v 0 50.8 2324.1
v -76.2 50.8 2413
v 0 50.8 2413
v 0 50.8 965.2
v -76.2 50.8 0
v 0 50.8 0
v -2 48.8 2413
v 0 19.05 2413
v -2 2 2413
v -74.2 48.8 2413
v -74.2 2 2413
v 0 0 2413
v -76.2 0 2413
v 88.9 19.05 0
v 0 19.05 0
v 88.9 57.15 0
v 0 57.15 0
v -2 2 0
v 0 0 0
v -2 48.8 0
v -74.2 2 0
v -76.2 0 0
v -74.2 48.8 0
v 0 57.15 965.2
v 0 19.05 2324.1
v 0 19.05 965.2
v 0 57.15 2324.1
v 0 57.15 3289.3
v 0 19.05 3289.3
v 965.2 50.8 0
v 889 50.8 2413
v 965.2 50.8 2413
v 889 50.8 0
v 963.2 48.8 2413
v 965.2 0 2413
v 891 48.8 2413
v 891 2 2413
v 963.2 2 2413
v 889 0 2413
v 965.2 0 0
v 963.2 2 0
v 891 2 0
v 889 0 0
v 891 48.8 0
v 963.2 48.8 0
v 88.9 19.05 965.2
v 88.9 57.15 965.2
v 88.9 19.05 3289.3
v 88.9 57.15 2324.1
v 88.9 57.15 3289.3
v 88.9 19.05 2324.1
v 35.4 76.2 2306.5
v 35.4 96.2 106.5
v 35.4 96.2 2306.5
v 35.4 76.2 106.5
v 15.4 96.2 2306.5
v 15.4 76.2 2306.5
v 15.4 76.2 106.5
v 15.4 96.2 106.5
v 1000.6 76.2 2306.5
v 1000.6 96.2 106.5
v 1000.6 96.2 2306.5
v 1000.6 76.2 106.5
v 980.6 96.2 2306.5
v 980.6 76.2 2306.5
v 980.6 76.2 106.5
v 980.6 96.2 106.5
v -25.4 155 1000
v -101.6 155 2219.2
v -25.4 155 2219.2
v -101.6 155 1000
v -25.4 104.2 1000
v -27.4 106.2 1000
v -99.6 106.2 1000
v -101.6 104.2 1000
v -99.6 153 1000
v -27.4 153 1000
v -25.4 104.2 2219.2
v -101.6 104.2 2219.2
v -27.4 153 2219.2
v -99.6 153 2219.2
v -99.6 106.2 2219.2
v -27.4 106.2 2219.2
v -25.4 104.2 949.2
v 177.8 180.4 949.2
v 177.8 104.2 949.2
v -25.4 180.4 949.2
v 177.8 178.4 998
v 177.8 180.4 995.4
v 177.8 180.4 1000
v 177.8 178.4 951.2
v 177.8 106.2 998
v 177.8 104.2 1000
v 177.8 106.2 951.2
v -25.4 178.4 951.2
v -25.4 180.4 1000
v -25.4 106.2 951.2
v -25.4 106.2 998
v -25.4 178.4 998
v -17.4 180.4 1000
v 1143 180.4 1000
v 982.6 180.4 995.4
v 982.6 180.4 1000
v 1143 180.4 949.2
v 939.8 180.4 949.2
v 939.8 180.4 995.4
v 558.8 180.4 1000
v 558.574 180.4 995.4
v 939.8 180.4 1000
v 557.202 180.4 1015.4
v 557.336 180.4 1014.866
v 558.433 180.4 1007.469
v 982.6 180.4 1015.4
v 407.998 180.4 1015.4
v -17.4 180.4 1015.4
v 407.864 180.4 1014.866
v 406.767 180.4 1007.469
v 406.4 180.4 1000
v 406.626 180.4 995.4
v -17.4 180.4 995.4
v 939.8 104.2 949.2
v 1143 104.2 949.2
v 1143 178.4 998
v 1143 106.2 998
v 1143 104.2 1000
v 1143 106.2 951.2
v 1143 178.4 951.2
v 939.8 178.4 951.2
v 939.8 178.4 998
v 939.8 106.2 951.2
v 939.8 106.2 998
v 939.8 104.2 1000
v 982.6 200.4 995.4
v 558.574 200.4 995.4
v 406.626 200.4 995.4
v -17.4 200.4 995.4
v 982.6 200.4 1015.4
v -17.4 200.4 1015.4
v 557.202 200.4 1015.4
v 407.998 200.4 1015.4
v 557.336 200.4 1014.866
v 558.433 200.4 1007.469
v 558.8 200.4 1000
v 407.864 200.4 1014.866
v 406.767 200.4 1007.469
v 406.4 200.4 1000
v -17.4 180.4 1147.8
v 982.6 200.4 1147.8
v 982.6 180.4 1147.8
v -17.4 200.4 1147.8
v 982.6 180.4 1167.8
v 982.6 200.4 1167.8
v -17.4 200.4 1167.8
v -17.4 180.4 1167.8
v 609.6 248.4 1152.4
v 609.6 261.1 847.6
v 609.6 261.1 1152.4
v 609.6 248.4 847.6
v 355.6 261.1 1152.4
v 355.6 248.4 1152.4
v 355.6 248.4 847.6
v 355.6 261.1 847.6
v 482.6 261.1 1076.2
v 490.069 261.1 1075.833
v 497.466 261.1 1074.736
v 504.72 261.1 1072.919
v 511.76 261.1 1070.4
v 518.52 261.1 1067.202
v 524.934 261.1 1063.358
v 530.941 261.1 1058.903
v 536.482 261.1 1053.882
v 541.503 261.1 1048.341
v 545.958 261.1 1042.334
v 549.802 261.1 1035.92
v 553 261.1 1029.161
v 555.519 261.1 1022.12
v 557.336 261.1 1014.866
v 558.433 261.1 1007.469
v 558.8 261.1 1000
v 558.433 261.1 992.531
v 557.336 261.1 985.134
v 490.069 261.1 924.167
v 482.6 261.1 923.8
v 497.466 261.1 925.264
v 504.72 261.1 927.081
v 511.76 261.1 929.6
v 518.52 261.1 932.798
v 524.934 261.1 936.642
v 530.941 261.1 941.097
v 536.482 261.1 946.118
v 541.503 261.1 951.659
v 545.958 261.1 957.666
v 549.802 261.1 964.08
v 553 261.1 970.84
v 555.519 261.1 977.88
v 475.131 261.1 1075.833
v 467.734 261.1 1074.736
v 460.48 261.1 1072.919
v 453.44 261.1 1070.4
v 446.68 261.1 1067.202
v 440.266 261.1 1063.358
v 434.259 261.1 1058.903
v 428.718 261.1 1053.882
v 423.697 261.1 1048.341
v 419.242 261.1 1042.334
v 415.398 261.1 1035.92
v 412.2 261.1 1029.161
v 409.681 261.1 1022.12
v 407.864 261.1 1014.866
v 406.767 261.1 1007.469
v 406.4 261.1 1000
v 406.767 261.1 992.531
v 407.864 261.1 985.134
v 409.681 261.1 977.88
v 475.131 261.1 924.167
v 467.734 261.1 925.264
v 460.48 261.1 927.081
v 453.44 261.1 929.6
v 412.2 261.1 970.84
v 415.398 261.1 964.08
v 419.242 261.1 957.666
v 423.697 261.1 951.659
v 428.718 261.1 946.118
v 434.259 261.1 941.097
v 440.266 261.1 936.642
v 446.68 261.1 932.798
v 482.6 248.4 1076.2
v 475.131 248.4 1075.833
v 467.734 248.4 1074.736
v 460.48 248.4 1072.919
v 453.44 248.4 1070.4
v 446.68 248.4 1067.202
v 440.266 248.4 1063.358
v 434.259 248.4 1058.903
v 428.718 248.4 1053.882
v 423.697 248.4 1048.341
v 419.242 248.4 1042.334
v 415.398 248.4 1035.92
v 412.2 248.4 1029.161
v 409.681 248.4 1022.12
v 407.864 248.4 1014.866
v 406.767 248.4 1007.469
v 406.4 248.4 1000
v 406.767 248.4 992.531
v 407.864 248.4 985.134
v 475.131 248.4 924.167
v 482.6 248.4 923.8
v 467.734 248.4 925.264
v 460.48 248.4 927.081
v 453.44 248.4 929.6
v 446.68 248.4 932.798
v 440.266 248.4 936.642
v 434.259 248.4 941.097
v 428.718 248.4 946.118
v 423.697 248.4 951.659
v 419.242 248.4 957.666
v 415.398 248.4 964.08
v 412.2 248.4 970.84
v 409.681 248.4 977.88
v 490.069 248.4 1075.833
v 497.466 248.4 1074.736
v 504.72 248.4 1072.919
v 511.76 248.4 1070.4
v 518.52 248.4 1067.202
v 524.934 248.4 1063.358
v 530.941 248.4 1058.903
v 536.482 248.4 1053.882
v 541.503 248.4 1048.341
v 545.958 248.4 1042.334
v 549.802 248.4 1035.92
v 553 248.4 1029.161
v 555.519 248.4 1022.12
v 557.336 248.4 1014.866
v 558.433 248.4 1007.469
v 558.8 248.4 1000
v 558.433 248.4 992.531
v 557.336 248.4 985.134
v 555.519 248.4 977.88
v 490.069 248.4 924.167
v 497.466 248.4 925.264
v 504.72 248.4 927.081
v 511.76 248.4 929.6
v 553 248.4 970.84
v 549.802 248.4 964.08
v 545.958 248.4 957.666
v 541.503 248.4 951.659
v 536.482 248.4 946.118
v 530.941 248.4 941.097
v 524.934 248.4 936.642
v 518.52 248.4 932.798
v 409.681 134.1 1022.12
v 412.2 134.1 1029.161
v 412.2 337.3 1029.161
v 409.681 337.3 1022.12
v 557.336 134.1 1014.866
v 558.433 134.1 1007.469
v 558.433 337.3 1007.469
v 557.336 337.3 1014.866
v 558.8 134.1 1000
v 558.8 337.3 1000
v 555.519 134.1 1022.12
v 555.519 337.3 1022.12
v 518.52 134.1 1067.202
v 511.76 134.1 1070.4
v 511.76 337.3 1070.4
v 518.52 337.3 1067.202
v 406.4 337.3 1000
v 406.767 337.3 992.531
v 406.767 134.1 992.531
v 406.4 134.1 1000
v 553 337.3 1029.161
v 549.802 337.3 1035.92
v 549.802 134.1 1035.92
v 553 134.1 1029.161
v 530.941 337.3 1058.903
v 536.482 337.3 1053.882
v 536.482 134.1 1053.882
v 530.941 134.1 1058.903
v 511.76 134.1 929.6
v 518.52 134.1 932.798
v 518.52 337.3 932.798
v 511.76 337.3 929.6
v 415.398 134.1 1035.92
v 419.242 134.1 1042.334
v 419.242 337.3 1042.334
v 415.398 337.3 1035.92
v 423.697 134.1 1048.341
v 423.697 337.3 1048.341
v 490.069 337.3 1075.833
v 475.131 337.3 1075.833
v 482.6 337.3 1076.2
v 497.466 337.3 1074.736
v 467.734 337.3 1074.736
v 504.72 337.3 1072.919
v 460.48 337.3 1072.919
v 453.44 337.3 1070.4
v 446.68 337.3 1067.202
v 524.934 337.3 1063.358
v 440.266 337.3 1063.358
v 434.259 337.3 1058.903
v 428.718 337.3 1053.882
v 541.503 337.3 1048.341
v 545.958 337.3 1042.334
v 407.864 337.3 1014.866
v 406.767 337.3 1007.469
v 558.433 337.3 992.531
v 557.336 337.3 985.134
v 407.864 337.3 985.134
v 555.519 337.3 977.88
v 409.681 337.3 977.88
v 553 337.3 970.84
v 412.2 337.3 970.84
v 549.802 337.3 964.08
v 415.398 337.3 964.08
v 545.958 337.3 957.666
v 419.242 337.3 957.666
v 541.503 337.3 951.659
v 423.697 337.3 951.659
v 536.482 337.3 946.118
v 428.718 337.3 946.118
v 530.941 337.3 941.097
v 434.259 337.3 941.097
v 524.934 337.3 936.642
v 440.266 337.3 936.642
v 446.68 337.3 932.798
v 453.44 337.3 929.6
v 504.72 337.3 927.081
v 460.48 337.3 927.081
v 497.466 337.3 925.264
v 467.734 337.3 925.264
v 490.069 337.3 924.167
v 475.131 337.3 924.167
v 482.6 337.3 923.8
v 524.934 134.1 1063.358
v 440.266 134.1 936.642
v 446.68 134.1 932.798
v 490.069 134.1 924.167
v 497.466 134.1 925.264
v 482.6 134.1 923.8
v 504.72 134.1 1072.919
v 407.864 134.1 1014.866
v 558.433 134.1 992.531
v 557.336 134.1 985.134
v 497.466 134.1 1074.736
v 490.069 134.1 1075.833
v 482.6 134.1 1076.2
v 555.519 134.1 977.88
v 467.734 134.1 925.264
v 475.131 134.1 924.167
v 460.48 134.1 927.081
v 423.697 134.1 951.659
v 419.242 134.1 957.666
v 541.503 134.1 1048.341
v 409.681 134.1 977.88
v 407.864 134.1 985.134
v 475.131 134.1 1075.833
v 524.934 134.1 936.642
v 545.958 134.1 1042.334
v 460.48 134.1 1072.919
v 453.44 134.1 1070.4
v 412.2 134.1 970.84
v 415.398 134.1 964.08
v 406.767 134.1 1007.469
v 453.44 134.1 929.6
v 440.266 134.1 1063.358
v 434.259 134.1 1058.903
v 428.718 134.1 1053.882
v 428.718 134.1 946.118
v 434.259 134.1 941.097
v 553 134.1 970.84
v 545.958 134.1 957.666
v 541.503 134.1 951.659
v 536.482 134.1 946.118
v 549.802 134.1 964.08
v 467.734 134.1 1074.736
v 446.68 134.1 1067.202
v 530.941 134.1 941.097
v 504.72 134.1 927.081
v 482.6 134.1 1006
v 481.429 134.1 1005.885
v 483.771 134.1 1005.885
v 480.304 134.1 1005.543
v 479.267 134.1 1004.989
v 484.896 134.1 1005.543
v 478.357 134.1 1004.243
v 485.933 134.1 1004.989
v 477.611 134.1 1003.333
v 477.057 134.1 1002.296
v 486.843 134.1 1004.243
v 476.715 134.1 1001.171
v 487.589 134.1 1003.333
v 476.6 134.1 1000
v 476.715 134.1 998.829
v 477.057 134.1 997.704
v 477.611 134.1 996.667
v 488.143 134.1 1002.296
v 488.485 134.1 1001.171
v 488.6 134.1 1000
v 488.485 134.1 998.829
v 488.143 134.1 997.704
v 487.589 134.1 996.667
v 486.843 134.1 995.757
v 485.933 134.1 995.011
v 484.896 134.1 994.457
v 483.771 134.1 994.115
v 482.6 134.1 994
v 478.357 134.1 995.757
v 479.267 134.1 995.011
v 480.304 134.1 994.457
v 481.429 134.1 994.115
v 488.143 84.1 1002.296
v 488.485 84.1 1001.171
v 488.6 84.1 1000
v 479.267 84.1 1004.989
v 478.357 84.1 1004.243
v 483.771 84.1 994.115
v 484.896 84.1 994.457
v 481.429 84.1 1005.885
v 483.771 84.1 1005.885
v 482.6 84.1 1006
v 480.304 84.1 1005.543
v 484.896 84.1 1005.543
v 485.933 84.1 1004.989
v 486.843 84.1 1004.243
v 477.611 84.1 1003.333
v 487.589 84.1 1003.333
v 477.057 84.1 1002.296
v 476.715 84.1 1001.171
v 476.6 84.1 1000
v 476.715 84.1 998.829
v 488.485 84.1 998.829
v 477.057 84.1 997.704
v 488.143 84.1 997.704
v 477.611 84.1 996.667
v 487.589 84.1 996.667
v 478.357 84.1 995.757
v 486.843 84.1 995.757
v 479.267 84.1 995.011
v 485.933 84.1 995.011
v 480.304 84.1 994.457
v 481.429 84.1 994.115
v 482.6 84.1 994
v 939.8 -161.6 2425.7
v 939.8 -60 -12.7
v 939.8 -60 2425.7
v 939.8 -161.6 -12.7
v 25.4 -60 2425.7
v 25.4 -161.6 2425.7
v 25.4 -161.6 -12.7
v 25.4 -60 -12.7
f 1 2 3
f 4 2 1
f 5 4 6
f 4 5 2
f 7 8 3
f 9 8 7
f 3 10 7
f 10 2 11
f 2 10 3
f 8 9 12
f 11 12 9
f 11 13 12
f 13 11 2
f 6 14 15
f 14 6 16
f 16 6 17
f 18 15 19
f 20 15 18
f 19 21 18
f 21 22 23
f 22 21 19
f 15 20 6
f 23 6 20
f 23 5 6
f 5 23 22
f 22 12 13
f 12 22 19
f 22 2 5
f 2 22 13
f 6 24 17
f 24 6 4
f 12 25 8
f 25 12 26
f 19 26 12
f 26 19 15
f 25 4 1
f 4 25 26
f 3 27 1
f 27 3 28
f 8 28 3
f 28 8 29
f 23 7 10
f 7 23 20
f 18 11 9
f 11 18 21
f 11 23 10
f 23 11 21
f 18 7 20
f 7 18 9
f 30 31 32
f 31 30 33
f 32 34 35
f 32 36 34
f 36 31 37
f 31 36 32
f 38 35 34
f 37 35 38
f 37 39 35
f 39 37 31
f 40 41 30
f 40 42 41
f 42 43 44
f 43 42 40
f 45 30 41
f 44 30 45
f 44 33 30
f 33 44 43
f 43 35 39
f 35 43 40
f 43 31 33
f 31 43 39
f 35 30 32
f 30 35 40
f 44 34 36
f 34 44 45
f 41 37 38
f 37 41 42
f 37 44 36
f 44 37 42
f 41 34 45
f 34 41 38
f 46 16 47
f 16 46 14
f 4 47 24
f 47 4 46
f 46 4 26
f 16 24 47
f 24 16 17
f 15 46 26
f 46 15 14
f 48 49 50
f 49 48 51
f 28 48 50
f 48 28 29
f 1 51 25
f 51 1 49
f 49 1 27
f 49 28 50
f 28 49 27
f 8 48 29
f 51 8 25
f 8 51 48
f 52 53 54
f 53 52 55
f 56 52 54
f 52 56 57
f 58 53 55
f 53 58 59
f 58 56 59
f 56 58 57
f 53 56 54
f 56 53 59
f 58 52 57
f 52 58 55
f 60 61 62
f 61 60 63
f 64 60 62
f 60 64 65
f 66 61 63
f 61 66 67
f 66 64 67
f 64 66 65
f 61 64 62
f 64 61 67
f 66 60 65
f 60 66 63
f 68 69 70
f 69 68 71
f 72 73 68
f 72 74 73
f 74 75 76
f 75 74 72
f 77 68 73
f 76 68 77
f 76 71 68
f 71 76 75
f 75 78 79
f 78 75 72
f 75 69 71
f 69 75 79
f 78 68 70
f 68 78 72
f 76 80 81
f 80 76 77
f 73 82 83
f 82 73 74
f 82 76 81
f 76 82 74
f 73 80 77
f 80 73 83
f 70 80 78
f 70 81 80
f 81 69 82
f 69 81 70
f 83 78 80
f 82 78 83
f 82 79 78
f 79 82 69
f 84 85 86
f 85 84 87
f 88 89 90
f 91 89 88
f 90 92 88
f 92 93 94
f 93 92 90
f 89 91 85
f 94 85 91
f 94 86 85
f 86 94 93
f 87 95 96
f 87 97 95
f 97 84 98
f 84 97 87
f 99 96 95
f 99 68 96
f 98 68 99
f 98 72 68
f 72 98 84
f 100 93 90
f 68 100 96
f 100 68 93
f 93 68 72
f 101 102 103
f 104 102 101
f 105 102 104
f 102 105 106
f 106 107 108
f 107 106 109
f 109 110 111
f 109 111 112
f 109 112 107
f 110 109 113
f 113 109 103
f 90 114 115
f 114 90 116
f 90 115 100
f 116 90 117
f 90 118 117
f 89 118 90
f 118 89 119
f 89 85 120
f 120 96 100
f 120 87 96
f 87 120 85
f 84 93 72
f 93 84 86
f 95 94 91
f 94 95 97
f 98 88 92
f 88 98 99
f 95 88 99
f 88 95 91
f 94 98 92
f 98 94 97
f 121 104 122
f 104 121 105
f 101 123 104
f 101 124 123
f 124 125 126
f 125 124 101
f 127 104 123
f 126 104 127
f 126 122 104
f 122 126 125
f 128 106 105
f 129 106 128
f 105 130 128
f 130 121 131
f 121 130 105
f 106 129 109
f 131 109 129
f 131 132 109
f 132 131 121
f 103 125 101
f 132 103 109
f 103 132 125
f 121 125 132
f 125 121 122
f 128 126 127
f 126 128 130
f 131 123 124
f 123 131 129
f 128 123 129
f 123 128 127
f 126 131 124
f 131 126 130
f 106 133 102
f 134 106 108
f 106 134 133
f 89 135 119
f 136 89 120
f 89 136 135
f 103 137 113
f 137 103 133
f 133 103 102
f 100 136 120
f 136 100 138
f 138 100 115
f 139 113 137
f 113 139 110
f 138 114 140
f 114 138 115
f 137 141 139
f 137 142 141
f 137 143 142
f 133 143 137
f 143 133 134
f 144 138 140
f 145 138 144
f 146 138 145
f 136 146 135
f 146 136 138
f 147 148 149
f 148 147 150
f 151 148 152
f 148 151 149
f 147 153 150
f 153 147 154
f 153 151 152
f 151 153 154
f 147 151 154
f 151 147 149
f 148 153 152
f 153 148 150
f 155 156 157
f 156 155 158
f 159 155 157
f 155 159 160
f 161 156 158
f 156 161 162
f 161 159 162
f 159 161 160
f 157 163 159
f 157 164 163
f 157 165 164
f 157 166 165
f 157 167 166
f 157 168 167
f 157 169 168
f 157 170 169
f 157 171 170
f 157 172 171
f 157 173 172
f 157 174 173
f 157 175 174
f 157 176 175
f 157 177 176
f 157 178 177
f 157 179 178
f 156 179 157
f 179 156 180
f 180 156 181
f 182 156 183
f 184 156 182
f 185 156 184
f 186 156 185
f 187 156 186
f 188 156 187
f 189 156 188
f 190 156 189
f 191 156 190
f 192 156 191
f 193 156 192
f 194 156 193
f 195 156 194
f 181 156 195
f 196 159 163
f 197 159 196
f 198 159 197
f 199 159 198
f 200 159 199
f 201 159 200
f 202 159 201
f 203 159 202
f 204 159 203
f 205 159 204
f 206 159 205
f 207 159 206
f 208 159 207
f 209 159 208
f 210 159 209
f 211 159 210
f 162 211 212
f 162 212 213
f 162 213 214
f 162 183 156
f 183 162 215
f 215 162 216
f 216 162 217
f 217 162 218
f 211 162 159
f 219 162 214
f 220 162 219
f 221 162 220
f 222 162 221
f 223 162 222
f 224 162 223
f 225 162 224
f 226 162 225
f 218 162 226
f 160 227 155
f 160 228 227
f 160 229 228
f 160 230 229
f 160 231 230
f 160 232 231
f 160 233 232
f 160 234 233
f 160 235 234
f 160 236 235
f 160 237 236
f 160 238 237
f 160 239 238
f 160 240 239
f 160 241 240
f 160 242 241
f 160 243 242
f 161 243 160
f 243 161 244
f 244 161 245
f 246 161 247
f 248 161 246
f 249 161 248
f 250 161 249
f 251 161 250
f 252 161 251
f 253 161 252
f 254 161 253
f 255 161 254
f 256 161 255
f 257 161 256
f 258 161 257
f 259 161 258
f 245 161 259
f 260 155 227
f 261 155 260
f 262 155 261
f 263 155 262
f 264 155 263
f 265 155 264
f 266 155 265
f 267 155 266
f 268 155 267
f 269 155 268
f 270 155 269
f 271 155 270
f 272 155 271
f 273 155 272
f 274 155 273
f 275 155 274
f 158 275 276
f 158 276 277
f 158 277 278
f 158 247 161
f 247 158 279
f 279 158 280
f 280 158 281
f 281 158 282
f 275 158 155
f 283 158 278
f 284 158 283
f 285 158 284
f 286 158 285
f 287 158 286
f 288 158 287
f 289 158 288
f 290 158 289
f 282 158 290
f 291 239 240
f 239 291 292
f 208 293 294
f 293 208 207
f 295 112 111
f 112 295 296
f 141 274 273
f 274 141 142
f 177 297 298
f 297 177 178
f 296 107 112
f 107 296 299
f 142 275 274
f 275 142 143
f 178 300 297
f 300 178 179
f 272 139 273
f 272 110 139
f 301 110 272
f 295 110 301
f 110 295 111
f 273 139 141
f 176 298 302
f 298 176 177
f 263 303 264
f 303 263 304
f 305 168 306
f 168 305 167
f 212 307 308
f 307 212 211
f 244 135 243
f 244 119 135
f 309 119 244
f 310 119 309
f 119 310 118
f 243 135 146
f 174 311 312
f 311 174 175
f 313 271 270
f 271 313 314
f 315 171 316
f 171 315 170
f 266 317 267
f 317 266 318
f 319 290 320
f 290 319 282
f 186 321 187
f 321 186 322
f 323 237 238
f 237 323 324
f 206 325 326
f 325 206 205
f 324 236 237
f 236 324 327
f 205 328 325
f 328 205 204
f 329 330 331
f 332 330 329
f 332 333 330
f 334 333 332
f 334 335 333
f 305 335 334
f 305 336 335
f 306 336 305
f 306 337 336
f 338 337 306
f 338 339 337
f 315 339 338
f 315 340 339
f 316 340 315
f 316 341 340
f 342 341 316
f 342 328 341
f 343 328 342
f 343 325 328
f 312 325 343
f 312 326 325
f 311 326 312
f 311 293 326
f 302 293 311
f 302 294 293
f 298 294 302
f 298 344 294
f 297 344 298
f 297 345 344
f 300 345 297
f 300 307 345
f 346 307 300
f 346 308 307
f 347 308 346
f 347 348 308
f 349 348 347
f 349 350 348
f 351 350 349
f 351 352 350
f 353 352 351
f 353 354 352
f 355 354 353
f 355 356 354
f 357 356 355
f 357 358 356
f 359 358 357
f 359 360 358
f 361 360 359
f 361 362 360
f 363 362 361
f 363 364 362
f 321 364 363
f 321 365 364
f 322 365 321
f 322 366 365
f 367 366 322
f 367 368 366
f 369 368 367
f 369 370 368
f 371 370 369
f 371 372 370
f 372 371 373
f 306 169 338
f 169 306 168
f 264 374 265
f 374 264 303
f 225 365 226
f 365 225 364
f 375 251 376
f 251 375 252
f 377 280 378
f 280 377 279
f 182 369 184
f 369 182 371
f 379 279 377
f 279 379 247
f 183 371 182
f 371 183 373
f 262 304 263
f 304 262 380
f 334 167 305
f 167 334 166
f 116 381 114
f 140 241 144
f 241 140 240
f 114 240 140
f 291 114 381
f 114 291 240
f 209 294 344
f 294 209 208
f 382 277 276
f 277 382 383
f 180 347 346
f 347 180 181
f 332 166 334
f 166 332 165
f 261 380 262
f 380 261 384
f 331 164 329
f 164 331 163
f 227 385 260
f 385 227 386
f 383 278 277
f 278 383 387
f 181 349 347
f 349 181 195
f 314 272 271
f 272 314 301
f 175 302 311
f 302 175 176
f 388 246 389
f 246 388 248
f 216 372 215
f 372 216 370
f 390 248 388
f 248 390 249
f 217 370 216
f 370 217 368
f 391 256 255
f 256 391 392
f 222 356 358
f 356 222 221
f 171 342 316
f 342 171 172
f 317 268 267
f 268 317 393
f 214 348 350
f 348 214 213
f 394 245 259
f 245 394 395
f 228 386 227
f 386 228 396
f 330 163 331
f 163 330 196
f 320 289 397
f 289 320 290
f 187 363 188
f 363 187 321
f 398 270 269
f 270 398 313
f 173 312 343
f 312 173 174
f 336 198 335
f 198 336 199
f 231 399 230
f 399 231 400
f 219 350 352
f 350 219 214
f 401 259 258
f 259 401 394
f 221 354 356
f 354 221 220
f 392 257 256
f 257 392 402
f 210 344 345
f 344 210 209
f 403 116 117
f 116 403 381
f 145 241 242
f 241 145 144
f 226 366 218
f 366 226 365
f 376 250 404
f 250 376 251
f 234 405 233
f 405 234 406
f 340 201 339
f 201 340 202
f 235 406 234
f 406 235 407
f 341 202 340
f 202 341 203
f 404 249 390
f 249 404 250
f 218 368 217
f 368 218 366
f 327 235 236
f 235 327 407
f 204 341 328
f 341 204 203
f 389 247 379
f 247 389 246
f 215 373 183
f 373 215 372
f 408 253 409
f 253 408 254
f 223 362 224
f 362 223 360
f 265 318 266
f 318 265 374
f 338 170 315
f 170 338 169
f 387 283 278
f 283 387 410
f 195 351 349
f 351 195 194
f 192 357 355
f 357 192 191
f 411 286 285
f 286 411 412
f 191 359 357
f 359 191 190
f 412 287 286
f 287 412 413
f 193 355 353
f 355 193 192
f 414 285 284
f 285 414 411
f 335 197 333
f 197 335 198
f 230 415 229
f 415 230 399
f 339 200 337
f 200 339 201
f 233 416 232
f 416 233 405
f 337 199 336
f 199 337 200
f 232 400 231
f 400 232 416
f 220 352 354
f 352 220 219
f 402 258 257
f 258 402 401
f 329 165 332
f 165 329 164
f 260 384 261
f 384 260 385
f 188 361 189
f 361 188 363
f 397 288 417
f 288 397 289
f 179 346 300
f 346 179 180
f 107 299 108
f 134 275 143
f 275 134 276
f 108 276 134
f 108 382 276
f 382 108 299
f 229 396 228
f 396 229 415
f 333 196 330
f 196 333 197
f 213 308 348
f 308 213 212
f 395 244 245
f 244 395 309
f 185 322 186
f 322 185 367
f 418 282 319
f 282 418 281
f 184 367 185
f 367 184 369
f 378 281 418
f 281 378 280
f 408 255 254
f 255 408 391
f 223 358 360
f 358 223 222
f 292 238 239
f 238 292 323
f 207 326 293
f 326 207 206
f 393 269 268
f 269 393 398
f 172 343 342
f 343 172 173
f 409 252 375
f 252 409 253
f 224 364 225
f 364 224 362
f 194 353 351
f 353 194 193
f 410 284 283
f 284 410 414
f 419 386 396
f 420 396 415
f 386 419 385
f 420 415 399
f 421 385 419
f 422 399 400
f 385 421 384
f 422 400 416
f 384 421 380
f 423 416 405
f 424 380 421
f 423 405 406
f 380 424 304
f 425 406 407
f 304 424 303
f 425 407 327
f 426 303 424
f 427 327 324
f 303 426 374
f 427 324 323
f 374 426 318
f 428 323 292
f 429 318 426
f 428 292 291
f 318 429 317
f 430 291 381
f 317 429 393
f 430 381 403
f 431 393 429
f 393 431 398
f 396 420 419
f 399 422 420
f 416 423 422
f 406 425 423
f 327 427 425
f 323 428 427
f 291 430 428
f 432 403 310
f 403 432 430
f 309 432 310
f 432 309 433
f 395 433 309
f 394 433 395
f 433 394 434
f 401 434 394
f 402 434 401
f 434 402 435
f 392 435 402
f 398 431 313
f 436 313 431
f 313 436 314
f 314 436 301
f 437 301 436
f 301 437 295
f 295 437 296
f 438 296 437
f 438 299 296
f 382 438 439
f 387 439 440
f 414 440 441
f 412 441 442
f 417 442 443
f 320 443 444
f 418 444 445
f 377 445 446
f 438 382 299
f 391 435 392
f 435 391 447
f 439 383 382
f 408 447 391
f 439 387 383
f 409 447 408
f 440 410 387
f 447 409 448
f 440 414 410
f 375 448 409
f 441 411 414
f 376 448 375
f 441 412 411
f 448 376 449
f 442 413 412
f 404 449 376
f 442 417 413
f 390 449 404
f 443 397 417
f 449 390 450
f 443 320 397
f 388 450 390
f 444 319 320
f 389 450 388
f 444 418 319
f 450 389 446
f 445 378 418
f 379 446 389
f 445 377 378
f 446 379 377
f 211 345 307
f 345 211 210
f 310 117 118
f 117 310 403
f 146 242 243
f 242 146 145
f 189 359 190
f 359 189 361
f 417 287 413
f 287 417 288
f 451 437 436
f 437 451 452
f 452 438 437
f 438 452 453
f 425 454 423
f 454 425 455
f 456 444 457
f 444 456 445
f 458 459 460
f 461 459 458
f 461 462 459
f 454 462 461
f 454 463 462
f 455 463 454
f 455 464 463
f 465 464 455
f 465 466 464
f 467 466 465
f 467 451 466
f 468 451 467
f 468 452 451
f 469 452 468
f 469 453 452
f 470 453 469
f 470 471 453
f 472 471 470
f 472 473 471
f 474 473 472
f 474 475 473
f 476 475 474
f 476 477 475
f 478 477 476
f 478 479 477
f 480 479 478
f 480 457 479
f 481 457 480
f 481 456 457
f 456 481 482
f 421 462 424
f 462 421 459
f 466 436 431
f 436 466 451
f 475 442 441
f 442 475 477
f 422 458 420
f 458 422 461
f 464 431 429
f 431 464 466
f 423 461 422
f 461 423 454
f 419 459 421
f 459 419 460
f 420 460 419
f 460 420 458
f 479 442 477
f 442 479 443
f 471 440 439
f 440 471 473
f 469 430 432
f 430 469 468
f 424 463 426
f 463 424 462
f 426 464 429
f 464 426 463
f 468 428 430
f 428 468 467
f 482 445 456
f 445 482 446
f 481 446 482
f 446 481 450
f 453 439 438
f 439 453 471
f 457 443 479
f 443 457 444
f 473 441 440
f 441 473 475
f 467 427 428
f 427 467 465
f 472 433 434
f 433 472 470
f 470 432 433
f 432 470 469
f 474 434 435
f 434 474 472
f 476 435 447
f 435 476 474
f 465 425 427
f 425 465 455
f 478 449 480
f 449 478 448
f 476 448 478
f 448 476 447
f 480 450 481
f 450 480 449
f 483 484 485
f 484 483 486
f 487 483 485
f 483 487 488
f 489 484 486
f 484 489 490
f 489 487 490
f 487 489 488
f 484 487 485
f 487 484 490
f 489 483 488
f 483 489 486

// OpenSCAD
// Complete Router Sled Assembly
// Combines Y-frame and X-gantry with proper positioning

// Import component modules (if using separate files, otherwise include inline)
// For standalone use, this file includes all modules inline

// All dimensions in millimeters

// === SHARED DIMENSIONS ===
tube_width = 2 * 25.4;    // 50.8mm
tube_height = 3 * 25.4;   // 76.2mm
tube_wall = 2;            // 14 gauge ≈ 2mm

// Y-frame dimensions
y_tube_length = 95 * 25.4;  // 2413mm
y_lumber_length = 38 * 25.4;  // 965.2mm
y_rail_length = 2200;

// X-gantry dimensions
x_tube_length = 40 * 25.4;  // 1016mm
x_cross_brace_length = 8 * 25.4;  // 203.2mm
x_rail_length = 1000;

// Colors
steel_color = [0.6, 0.6, 0.7];
wood_color = [0.8, 0.6, 0.4];
rail_color = [0.3, 0.3, 0.3];
plate_color = [0.9, 0.9, 0.95, 0.7];

// === MODULES ===

module steel_tube(length) {
    color(steel_color)
    difference() {
        cube([tube_width, tube_height, length]);
        translate([tube_wall, tube_wall, -1])
        cube([tube_width - 2*tube_wall, tube_height - 2*tube_wall, length + 2]);
    }
}

module y_frame_base() {
    lumber_width = 3.5 * 25.4;
    lumber_height = 1.5 * 25.4;

    // First tube
    translate([0, 0, 0])
    rotate([0, 0, 90])
    steel_tube(y_tube_length);

    // Second tube
    translate([y_lumber_length, 0, 0])
    rotate([0, 0, 90])
    steel_tube(y_tube_length);

    // Cross-braces
    color(wood_color) {
        translate([0, tube_height/2 - lumber_height/2, 0])
        cube([lumber_width, lumber_height, y_lumber_length]);

        translate([0, tube_height/2 - lumber_height/2, y_tube_length - lumber_width])
        cube([lumber_width, lumber_height, y_lumber_length]);
    }
}

module y_rails() {
    rail_width = 20;
    rail_height = 20;

    color(rail_color) {
        // Left rail
        translate([tube_width/2 - rail_width/2, tube_height, (y_tube_length - y_rail_length)/2])
        cube([rail_width, rail_height, y_rail_length]);

        // Right rail
        translate([y_lumber_length + tube_width/2 - rail_width/2, tube_height, (y_tube_length - y_rail_length)/2])
        cube([rail_width, rail_height, y_rail_length]);
    }
}

module x_gantry(position_on_y) {
    // Position is Z coordinate along Y-rails where gantry sits

    // Offset for centering gantry on Y-frame
    x_offset = y_lumber_length/2 - x_tube_length/2;

    translate([x_offset, tube_height + 28, position_on_y]) {
        // Front tube
        translate([0, 0, 0])
        rotate([0, 0, 90])
        steel_tube(x_tube_length);

        // Rear tube
        translate([0, 0, x_cross_brace_length])
        rotate([0, 0, 90])
        steel_tube(x_tube_length);

        // Cross-braces
        translate([0, 0, 0])
        rotate([0, 90, 0])
        steel_tube(x_cross_brace_length);

        translate([x_tube_length - tube_width, 0, 0])
        rotate([0, 90, 0])
        steel_tube(x_cross_brace_length);

        // X-rails
        rail_width = 20;
        rail_height = 20;

        color(rail_color) {
            translate([x_tube_length/2 - x_rail_length/2, tube_height, tube_width/2 - rail_width/2])
            rotate([0, 90, 0])
            cube([rail_width, rail_height, x_rail_length]);

            translate([x_tube_length/2 - x_rail_length/2, tube_height, x_cross_brace_length - tube_width/2 - rail_width/2])
            rotate([0, 90, 0])
            cube([rail_width, rail_height, x_rail_length]);
        }
    }
}

module router_assembly(x_position, y_position) {
    // Position on X-gantry (x_position along X-rails, y_position along Y-rails)

    plate_width = 10 * 25.4;
    plate_length = 12 * 25.4;
    plate_thickness = 0.5 * 25.4;

    router_diameter = 6 * 25.4;
    router_height = 8 * 25.4;

    x_offset = y_lumber_length/2 - x_tube_length/2;

    // Calculate absolute position
    translate([x_offset + x_position - plate_width/2, tube_height + 28 + tube_height + 68, y_position - plate_length/2]) {
        // Router plate
        color(plate_color)
        difference() {
            cube([plate_width, plate_thickness, plate_length]);
            translate([plate_width/2, -1, plate_length/2])
            cylinder(h=plate_thickness+2, d=4*25.4, $fn=64);
        }

        // Router
        translate([plate_width/2, plate_thickness + router_diameter/2, plate_length/2]) {
            color([0.2, 0.3, 0.4]) {
                rotate([90, 0, 0])
                cylinder(h=router_height, d=router_diameter, $fn=64);

                translate([0, -router_height, 0])
                rotate([90, 0, 0])
                cylinder(h=50, d=12, $fn=32);
            }
        }
    }
}

// === COMPLETE ASSEMBLY ===

// Set gantry position (Z coordinate along Y-axis, 0 to ~2200mm)
gantry_y_position = 1000;  // Center position

// Set router position (X coordinate along X-axis, relative to gantry center)
router_x_position = x_tube_length/2;  // Center position

module complete_router_sled() {
    // Y-frame base
    y_frame_base();

    // Y-rails
    y_rails();

    // X-gantry (positioned on Y-rails)
    x_gantry(gantry_y_position);

    // Router assembly (positioned on X-gantry)
    router_assembly(router_x_position, gantry_y_position);

    // Reference work piece (optional, shown for scale)
    show_workpiece = true;
    if (show_workpiece) {
        workpiece_width = 36 * 25.4;
        workpiece_length = 96 * 25.4;
        workpiece_thickness = 4 * 25.4;

        translate([y_lumber_length/2 - workpiece_width/2, -workpiece_thickness - 60, y_tube_length/2 - workpiece_length/2])
        color([0.7, 0.5, 0.3, 0.5])
        cube([workpiece_width, workpiece_thickness, workpiece_length]);
    }
}

// Render
complete_router_sled();

// === VIEWING NOTES ===
// - Use OpenSCAD's view controls to rotate and inspect the assembly
// - Gantry position can be adjusted by changing gantry_y_position variable
// - Router position can be adjusted by changing router_x_position variable
// - Workpiece visibility can be toggled with show_workpiece variable

// === DIMENSIONS SUMMARY ===
// Overall footprint: 95" x 38" (2413mm x 965mm)
// Working envelope: ~86" x 39" (2186mm x 991mm)
// Height: Variable with adjustment (1" to 5" slab capacity)
// Frame weight: Approximately 60-80 lbs assembled
